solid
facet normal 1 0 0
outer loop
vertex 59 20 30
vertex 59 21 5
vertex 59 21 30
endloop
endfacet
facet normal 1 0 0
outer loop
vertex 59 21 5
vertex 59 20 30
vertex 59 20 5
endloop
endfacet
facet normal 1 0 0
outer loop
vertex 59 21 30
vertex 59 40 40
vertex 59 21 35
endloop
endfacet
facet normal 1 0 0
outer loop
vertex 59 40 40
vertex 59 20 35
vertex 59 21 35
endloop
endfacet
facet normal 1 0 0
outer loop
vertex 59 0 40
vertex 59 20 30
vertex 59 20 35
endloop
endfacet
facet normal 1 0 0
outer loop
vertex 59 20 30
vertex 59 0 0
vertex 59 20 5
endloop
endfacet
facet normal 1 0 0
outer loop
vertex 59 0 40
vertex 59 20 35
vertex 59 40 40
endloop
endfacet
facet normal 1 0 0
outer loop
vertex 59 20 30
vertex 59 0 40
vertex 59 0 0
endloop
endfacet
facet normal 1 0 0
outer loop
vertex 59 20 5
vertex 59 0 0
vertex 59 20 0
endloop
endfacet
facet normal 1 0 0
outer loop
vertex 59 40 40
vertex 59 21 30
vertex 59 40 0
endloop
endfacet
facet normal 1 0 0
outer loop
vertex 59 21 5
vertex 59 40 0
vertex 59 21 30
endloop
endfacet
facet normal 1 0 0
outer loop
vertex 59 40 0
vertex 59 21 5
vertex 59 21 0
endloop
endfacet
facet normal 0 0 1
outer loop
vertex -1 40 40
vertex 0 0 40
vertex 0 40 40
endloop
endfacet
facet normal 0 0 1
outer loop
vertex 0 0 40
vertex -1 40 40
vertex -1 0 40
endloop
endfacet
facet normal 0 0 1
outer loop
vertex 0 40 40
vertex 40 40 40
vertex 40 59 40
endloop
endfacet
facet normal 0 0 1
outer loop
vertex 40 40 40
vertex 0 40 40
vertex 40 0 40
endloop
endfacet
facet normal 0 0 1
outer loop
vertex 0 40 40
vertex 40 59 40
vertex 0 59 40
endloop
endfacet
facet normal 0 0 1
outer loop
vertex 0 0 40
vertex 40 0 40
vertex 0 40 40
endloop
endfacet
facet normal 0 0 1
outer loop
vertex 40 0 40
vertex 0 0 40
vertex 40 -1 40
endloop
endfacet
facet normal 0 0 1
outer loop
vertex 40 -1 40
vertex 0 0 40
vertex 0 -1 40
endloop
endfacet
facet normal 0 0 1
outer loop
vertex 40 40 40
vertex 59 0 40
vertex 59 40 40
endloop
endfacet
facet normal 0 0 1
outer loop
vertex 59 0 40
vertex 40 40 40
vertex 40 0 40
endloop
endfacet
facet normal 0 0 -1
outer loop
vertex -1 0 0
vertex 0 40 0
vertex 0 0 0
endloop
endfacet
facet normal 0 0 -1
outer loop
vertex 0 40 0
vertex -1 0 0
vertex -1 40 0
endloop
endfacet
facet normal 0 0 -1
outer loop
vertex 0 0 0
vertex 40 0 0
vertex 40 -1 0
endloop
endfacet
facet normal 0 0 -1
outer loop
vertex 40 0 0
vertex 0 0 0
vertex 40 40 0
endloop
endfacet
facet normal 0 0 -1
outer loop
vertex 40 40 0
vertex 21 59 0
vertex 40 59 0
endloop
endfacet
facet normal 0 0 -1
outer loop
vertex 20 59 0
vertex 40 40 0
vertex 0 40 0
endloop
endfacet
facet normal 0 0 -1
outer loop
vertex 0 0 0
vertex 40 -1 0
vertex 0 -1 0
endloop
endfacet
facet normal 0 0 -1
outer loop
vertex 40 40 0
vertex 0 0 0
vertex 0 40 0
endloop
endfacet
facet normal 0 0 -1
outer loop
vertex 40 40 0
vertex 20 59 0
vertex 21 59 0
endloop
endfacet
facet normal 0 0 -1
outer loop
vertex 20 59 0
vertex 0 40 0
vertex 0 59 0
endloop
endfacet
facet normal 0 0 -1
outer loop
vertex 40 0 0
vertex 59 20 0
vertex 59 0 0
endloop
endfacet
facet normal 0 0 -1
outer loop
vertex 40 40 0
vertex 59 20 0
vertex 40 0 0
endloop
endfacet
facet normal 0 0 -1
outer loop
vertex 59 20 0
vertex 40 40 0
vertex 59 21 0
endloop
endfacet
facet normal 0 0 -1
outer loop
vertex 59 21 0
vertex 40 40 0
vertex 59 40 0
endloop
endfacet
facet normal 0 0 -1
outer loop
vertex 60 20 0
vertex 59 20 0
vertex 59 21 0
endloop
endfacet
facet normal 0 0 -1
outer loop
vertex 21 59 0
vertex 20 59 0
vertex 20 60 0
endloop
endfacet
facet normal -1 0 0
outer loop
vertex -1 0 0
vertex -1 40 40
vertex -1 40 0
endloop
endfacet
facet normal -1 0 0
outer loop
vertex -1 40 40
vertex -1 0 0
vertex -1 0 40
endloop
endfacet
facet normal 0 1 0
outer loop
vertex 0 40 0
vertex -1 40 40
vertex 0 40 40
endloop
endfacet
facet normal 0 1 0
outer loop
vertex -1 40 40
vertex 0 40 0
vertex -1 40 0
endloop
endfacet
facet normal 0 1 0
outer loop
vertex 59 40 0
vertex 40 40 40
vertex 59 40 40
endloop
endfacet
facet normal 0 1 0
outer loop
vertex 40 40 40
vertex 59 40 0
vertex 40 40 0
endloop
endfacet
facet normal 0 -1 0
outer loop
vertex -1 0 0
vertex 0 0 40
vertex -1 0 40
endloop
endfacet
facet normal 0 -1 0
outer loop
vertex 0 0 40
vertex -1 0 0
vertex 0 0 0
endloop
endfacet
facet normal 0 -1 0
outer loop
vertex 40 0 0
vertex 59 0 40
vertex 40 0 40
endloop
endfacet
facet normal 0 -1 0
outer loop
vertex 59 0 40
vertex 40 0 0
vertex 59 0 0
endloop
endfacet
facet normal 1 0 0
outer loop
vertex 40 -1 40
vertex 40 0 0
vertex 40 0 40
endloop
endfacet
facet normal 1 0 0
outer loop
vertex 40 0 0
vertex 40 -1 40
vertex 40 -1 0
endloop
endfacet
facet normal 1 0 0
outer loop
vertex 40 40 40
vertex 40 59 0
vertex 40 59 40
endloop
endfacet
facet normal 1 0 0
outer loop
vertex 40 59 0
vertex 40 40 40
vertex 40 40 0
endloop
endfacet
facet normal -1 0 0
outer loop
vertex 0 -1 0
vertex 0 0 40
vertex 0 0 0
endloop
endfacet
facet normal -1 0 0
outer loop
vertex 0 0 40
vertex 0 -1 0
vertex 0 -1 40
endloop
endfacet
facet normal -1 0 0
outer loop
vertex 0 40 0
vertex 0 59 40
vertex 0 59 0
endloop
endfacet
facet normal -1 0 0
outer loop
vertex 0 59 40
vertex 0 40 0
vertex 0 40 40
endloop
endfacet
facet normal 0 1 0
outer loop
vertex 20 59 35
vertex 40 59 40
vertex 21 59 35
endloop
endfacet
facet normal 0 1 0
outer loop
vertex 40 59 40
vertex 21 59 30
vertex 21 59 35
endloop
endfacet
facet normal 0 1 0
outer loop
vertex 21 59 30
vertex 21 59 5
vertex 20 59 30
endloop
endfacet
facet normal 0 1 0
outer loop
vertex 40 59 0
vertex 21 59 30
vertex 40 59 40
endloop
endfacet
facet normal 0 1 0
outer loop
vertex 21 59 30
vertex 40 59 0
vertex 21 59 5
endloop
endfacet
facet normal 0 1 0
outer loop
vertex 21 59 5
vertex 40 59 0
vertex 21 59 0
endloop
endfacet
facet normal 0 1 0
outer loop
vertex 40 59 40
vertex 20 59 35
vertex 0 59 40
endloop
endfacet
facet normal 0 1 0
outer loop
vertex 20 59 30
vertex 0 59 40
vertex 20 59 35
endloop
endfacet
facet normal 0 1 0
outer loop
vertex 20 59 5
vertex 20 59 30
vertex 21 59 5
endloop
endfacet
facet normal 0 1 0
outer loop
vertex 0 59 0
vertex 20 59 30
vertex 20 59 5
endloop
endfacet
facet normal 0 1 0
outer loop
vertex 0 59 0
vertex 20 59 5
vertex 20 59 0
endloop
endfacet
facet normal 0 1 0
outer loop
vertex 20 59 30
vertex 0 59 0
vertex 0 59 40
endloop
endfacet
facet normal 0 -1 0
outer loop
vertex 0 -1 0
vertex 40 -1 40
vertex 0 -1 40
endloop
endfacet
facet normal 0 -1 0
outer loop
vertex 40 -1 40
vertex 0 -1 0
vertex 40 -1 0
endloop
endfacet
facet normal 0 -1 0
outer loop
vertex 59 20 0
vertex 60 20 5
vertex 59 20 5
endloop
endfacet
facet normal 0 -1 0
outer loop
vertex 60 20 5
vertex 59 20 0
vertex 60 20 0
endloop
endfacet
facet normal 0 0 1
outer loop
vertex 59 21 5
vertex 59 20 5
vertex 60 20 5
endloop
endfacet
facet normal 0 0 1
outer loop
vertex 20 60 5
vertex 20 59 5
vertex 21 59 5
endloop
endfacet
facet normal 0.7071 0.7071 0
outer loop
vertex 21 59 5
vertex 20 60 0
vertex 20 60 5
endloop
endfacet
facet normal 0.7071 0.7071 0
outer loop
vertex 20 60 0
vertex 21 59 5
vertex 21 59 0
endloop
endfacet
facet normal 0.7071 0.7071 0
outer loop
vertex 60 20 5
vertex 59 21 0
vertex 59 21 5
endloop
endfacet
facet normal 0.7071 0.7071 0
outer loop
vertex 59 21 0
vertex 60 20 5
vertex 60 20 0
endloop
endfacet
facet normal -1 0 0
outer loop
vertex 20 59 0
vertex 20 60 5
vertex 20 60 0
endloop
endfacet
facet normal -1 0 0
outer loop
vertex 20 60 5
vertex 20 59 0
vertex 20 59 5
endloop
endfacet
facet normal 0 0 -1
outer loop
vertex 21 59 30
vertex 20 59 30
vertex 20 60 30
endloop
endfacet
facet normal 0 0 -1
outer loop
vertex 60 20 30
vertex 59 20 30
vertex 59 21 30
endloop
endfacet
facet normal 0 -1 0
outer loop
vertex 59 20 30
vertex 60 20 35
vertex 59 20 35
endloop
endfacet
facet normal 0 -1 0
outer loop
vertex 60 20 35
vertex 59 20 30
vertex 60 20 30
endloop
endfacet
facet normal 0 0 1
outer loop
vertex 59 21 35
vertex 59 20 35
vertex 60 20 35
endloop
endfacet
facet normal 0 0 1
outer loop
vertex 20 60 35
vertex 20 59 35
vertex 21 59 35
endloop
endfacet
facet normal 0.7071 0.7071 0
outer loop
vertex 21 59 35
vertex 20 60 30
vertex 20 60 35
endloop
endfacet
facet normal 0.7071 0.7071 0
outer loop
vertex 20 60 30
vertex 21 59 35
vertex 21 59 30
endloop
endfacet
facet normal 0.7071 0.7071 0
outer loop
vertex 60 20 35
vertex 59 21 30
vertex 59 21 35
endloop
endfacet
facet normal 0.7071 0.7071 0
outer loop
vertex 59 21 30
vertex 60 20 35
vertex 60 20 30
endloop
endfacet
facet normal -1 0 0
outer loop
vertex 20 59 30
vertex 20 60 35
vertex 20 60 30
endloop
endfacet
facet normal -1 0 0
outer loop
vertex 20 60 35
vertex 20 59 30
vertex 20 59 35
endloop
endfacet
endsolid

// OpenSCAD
// Parameters
leg_length_x = 40; //[20:80:1]
leg_length_y = 40; //[20:80:1]
height_z = 35; //[18:70:1]
base_thickness = 5; //[3:10:1]
side_thickness = 5; //[3:10:1]
overlap = 1; //[0.5:2:0.5]
hole_count_per_face = 1; //[1:2:1]
hole_offset_from_inner_corner = 15; //[8:30:1]
hole_diameter = 9; //[6:12:0.5]
extrusion_size = 40; //[20:80:1]
extrusion_length_x = 60; //[40:120:1]
extrusion_length_y = 60; //[40:120:1]

// Extrusion - complete geometry
module extrusion() {
  color([0.75, 0.75, 0.77]) {
    // X-axis extrusion
    translate([extrusion_length_x/2 - overlap, extrusion_size/2, extrusion_size/2])
      cube([extrusion_length_x, extrusion_size, extrusion_size], center=true);
    // Y-axis extrusion
    translate([extrusion_size/2, extrusion_length_y/2 - overlap, extrusion_size/2])
      cube([extrusion_size, extrusion_length_y, extrusion_size], center=true);
  }
}

// Extrusion Inner Corner Bracket - complete geometry
module extrusion_inner_corner_bracket() {
  color("Silver") {
    union() {
      // Base plates
      translate([leg_length_x/2, base_thickness/2, height_z/2])
        cube([leg_length_x, base_thickness, height_z], center=true);
      translate([base_thickness/2, leg_length_y/2, height_z/2])
        cube([base_thickness, leg_length_y, height_z], center=true);
      // Side gussets
      translate([leg_length_x/2, leg_length_y/2, side_thickness/2])
        linear_extrude(height=side_thickness, center=true)
        polygon(points=[[0, 0], [leg_length_x, 0], [0, leg_length_y]]);
      translate([leg_length_x/2, leg_length_y/2, height_z - side_thickness/2])
        linear_extrude(height=side_thickness, center=true)
        polygon(points=[[0, 0], [leg_length_x, 0], [0, leg_length_y]]);
    }
  }
}

// Extrusion Corner Bracket - complete geometry
module extrusion_corner_bracket() {
  color("Silver") {
    union() {
      // Base plates
      translate([leg_length_x/2, base_thickness/2, height_z/2])
        cube([leg_length_x, base_thickness, height_z], center=true);
      translate([base_thickness/2, leg_length_y/2, height_z/2])
        cube([base_thickness, leg_length_y, height_z], center=true);
      // Side gussets
      translate([leg_length_x/2, leg_length_y/2, side_thickness/2])
        linear_extrude(height=side_thickness, center=true)
        polygon(points=[[0, 0], [leg_length_x, 0], [0, leg_length_y]]);
      translate([leg_length_x/2, leg_length_y/2, height_z - side_thickness/2])
        linear_extrude(height=side_thickness, center=true)
        polygon(points=[[0, 0], [leg_length_x, 0], [0, leg_length_y]]);
    }
  }
}

// Extrusion Corner Bracket 3D - complete geometry
module extrusion_corner_bracket_3D() {
  color("Silver") {
    union() {
      // Base plates
      translate([leg_length_x/2, base_thickness/2, height_z/2])
        cube([leg_length_x, base_thickness, height_z], center=true);
      translate([base_thickness/2, leg_length_y/2, height_z/2])
        cube([base_thickness, leg_length_y, height_z], center=true);
      // Side gussets
      translate([leg_length_x/2, leg_length_y/2, side_thickness/2])
        linear_extrude(height=side_thickness, center=true)
        polygon(points=[[0, 0], [leg_length_x, 0], [0, leg_length_y]]);
      translate([leg_length_x/2, leg_length_y/2, height_z - side_thickness/2])
        linear_extrude(height=side_thickness, center=true)
        polygon(points=[[0, 0], [leg_length_x, 0], [0, leg_length_y]]);
    }
  }
}

// Extrusion Corner Bracket Hole Positions - complete geometry
module extrusion_corner_bracket_hole_positions() {
  color("Silver") {
    union() {
      // Holes for X face
      translate([hole_offset_from_inner_corner, base_thickness/2, height_z/2])
        rotate([90, 0, 0])
        cylinder(r=hole_diameter/2, h=base_thickness + 2*overlap, center=true);
      // Holes for Y face
      translate([base_thickness/2, hole_offset_from_inner_corner, height_z/2])
        rotate([0, 90, 0])
        cylinder(r=hole_diameter/2, h=base_thickness + 2*overlap, center=true);
    }
  }
}

// Assembly
module assembly() {
  extrusion();
  translate([0, 0, 0]) extrusion_inner_corner_bracket();
  translate([0, 0, 0]) extrusion_corner_bracket();
  translate([0, 0, 0]) extrusion_corner_bracket_3D();
  translate([0, 0, 0]) extrusion_corner_bracket_hole_positions();
}

assembly();
